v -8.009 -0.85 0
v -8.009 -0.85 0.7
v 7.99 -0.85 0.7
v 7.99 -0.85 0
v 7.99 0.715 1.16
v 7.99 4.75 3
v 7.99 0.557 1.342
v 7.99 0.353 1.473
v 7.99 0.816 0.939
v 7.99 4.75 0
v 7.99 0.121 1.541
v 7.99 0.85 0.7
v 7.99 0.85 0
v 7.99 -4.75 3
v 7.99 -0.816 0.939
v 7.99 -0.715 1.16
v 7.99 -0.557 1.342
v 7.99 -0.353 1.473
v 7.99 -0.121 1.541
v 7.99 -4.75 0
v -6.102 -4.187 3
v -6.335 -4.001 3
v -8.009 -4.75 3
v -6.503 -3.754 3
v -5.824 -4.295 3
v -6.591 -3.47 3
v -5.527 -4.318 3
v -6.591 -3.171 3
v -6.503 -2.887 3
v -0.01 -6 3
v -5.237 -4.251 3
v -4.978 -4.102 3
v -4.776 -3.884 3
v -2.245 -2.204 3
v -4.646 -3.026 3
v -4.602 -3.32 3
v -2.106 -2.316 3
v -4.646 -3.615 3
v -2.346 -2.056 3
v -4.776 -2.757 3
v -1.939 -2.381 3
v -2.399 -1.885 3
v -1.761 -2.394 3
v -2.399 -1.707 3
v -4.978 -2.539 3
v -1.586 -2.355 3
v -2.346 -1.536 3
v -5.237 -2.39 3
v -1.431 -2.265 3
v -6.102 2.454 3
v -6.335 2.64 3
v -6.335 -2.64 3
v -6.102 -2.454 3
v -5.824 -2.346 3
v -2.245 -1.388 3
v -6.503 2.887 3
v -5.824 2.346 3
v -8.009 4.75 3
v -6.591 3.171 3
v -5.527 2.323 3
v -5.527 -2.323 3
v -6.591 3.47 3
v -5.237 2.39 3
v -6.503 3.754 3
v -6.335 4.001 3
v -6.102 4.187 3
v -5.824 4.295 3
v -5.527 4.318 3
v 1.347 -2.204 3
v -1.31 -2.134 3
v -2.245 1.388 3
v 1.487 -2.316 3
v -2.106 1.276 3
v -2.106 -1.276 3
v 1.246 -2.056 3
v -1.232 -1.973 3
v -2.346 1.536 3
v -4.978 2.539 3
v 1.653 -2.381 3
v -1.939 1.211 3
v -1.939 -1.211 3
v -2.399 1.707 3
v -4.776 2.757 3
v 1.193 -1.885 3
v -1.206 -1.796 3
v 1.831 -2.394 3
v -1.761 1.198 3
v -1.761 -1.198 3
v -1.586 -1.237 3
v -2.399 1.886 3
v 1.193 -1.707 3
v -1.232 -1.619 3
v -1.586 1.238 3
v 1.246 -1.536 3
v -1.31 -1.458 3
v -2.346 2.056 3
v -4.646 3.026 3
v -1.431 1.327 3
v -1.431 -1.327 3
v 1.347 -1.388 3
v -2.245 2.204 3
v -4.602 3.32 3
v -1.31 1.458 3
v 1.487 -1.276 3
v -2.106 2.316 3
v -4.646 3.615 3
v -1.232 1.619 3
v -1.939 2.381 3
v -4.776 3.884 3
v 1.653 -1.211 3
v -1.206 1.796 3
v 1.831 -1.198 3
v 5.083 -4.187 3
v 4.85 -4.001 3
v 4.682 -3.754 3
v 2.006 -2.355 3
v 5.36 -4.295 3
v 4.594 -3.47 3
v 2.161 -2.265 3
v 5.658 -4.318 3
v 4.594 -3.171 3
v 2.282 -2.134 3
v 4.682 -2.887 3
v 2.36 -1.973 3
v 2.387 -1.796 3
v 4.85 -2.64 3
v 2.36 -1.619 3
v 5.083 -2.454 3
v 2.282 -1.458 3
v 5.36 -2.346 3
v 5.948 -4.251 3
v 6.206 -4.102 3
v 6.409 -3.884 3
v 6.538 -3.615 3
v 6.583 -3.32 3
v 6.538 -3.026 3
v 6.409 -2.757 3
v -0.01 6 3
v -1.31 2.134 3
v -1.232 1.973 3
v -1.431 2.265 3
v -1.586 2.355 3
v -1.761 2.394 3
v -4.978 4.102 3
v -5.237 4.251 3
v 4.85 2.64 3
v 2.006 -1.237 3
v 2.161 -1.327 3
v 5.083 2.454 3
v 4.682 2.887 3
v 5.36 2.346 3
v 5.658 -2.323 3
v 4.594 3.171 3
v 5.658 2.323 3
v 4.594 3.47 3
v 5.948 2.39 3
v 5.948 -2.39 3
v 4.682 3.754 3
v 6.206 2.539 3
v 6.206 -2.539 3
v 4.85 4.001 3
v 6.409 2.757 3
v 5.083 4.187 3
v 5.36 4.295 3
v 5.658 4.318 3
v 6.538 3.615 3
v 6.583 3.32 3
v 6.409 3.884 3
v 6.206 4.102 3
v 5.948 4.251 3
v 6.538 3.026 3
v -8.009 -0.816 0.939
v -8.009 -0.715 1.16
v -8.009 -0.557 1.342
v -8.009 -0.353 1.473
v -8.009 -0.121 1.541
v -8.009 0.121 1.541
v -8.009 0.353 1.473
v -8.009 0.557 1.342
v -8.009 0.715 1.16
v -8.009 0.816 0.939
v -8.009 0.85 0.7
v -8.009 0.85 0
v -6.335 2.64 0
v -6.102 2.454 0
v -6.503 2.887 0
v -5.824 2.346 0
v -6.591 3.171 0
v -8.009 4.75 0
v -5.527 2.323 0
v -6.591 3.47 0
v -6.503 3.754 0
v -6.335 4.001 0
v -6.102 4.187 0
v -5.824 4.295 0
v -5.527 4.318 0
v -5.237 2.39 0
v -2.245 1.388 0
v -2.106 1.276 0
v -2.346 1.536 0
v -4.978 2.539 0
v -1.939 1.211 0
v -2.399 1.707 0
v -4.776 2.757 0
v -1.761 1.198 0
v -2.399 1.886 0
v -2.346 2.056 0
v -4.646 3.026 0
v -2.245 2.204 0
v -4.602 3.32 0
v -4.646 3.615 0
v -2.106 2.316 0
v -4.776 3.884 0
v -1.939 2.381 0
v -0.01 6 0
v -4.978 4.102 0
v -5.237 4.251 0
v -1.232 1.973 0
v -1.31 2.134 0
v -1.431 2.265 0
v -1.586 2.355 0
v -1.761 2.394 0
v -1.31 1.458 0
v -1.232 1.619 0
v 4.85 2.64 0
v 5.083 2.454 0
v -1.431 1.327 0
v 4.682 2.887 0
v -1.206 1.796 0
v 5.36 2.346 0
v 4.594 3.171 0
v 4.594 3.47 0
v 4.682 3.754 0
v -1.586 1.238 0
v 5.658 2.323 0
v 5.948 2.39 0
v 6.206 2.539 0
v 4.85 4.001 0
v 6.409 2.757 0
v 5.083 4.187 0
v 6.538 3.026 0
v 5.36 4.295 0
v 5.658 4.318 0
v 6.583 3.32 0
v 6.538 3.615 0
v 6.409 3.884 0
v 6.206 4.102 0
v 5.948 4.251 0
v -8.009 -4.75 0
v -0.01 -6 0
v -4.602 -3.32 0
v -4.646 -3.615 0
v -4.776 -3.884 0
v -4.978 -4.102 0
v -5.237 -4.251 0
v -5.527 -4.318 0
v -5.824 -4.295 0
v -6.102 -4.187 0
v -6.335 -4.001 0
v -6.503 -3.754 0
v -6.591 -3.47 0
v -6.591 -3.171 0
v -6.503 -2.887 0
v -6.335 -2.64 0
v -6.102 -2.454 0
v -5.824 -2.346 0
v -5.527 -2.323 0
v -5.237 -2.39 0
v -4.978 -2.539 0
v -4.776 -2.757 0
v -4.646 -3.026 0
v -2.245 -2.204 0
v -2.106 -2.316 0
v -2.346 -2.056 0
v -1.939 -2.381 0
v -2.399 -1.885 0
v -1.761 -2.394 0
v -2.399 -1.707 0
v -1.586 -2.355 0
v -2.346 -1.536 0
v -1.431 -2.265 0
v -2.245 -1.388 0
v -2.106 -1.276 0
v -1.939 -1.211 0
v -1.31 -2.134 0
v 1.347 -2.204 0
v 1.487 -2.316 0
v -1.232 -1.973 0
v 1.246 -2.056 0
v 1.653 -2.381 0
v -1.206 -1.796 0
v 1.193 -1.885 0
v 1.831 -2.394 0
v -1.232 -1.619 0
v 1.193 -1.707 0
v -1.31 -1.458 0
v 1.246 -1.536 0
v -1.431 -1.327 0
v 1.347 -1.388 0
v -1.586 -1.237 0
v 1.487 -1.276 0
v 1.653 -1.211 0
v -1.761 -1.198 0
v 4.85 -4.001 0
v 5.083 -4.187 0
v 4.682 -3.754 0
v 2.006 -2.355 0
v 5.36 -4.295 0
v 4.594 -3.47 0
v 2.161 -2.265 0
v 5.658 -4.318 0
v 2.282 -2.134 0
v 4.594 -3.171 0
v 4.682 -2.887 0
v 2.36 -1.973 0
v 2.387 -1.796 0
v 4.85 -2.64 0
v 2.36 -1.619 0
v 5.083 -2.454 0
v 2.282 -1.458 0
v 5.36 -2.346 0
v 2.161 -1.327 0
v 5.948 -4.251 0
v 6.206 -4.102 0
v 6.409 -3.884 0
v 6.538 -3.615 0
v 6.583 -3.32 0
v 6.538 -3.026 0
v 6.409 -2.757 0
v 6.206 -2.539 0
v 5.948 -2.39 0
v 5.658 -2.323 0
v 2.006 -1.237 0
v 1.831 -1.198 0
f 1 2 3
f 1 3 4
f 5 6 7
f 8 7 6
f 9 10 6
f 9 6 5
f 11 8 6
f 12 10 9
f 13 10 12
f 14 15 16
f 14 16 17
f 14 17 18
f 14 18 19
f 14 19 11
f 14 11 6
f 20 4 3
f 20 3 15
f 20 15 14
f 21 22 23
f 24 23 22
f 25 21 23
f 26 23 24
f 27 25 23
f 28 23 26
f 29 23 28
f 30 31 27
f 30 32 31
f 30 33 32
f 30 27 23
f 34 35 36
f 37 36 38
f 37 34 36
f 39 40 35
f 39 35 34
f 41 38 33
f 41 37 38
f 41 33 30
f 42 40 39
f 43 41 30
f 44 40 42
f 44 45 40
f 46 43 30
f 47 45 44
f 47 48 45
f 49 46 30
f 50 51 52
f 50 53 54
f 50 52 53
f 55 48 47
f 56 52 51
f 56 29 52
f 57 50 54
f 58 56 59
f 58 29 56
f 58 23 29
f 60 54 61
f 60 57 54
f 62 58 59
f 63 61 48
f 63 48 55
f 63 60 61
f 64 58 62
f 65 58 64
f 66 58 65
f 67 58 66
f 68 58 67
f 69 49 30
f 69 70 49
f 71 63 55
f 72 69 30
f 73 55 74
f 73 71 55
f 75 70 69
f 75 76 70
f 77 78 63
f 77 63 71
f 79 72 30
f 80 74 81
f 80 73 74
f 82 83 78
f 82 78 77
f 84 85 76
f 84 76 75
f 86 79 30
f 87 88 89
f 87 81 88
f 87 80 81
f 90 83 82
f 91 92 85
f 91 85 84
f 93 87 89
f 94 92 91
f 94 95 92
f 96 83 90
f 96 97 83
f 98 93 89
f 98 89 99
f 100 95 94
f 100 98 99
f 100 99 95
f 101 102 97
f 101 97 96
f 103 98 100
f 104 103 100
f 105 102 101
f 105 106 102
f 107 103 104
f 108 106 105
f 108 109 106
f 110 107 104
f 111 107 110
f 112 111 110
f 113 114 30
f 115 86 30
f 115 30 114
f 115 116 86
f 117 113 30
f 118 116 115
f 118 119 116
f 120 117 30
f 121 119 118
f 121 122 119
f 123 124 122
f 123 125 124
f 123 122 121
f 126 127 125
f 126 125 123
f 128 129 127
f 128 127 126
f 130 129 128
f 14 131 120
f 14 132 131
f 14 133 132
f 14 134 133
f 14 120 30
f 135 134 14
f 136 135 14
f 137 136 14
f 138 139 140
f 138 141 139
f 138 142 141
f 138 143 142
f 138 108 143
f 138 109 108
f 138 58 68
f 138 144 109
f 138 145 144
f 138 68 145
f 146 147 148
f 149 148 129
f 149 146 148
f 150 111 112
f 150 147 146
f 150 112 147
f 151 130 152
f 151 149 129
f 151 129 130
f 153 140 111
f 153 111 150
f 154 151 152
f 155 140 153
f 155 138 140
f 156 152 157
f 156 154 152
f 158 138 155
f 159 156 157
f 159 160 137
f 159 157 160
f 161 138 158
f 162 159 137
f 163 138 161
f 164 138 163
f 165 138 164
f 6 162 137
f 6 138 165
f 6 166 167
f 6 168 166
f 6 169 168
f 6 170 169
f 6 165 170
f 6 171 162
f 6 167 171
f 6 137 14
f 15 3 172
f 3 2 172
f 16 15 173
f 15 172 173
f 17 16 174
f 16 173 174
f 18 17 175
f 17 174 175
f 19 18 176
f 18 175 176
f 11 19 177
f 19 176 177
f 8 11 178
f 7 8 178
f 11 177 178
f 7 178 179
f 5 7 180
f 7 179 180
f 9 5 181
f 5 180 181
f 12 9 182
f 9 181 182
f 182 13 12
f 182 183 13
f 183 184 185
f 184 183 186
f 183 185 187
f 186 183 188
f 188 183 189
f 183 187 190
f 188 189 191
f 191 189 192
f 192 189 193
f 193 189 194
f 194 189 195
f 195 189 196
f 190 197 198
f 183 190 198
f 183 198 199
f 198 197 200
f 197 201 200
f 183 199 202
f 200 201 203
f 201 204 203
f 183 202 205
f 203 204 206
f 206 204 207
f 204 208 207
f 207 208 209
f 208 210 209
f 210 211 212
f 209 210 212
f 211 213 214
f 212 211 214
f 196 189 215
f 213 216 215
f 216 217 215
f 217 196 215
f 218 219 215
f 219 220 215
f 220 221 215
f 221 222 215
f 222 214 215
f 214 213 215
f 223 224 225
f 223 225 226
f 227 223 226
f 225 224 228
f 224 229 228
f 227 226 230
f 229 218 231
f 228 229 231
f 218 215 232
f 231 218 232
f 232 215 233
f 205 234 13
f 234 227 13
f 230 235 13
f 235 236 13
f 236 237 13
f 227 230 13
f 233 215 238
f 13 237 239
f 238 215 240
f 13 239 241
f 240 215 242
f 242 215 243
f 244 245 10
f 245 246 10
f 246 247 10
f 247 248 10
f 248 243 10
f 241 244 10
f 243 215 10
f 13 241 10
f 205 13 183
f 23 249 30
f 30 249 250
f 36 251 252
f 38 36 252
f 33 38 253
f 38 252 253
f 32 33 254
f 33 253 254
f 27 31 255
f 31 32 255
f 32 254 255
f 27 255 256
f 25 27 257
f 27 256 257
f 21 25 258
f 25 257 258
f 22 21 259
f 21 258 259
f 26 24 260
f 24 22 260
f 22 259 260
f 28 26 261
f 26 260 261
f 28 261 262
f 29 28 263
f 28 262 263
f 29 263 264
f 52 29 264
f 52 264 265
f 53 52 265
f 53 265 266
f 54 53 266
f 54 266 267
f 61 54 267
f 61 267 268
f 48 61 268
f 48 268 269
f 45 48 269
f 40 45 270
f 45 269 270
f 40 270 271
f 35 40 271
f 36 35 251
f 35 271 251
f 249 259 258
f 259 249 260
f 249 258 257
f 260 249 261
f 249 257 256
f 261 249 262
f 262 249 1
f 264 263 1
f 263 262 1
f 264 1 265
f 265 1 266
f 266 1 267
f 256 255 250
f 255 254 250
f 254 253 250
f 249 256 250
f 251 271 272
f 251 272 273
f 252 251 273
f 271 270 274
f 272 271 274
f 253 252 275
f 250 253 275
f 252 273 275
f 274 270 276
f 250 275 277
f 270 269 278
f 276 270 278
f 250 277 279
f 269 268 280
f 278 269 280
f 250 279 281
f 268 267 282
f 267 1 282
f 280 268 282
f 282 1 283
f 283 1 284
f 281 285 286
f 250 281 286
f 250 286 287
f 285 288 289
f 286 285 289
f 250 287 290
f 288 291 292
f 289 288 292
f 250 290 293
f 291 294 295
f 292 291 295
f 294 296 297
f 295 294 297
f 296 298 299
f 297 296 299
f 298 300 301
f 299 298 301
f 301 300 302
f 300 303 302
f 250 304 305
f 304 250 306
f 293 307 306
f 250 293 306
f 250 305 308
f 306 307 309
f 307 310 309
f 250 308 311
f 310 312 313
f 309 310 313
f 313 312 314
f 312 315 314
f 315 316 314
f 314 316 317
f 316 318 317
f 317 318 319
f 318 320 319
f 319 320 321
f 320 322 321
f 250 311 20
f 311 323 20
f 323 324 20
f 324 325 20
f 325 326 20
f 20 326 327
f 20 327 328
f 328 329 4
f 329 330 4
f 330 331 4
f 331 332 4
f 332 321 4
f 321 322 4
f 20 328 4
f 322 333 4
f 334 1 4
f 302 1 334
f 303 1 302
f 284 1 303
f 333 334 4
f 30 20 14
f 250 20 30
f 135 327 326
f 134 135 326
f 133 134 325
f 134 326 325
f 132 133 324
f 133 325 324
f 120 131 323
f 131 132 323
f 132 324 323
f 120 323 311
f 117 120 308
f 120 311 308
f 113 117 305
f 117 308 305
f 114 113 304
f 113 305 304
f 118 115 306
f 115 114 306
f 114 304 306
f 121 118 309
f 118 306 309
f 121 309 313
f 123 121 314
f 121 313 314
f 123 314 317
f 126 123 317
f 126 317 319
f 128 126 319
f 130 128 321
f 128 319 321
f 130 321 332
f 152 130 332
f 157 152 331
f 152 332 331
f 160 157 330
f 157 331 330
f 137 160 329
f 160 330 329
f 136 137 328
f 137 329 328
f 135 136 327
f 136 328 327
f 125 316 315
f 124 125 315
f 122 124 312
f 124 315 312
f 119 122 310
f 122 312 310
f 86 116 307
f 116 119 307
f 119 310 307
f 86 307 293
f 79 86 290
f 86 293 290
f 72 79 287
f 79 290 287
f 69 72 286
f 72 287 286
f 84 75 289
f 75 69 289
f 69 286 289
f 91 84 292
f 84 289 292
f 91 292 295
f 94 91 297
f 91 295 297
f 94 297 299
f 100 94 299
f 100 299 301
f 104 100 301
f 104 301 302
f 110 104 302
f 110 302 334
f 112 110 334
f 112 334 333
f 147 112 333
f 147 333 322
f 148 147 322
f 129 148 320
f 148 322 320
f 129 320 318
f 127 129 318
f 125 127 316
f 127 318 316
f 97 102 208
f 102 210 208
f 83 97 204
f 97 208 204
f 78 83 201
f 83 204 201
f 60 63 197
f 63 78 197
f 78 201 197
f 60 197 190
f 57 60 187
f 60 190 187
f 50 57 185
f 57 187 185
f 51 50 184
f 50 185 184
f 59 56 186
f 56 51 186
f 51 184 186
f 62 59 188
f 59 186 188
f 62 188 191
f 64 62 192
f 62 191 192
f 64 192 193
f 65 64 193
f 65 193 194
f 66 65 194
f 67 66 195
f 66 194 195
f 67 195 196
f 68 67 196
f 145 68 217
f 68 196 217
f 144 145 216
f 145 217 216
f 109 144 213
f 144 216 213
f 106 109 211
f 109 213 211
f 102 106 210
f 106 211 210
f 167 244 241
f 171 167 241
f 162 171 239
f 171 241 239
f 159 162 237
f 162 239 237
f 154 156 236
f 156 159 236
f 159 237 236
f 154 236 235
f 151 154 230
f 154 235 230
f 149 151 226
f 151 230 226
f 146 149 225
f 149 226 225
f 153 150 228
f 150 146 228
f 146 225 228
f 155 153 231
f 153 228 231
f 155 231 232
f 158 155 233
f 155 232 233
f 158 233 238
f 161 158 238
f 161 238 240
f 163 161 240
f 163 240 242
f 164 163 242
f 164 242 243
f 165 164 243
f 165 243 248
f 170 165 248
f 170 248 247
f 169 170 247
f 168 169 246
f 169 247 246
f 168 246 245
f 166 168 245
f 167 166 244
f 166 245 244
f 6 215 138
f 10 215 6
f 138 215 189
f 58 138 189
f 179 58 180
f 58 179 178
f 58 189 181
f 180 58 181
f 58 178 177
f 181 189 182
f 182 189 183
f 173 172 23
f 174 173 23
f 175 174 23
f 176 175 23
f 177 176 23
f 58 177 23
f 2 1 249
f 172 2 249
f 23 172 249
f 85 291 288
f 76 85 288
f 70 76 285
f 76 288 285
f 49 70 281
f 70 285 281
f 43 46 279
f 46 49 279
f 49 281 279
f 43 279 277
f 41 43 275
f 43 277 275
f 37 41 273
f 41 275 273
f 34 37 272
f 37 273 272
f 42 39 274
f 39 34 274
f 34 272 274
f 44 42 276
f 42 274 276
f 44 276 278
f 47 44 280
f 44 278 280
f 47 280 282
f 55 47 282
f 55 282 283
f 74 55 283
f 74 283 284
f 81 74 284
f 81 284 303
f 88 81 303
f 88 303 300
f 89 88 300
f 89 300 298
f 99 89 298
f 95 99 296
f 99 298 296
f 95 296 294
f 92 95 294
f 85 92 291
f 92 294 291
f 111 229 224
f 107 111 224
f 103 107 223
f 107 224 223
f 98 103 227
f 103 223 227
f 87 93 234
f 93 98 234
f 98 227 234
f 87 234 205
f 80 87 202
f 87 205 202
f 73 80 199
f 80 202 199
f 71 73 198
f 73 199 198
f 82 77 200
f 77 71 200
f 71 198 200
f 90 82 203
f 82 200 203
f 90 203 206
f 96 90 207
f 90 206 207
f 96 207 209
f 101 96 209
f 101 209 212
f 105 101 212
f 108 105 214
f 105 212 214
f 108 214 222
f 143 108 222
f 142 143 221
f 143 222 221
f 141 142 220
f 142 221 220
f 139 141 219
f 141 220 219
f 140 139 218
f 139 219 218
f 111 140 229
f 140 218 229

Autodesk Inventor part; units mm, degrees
ref_plane "YZ Plane" through (0, 0, 0) normal (1, 0, 0) x (0, 1, 0)
ref_plane "XZ Plane" through (0, 0, 0) normal (0, 1, 0) x (-1, 0, 0)
ref_plane "XY Plane" through (0, 0, 0) normal (0, 0, 1) x (1, 0, 0)
sketch "Sketch1" plane through (0, 0, 0) normal (0, 0, 1) x (1, 0, 0)
  line L0 (-8.0095, -1.25) -> (7.9905, -1.25) construction
  line L1 (7.9905, -1.25) -> (7.9905, 1.25) construction
  line L2 (7.9905, 1.25) -> (-8.0095, 1.25) construction
  line L3 (-8.0095, 1.25) -> (-8.0095, -1.25) construction
  line L4 (-8.0095, -1.25) -> (7.9905, 1.25) construction
  line L5 (7.9905, -1.25) -> (-8.0095, 1.25) construction
  circle A0 centre (5.5829, 3.3205) radius 1
  line L6 (-0.0095, 0) -> (-0.0095, 6) construction
  line L7 (-0.0095, 0) -> (-0.0095, -6) construction
  line L8 (-0.0095, 6) -> (-8.0095, 4.75)
  line L9 (-8.0095, 4.75) -> (-8.0095, -4.75)
  line L10 (-8.0095, -4.75) -> (-0.0095, -6)
  line L11 (-0.0095, 6) -> (7.9905, 4.75)
  line L12 (7.9905, 4.75) -> (7.9905, -4.75)
  line L13 (7.9905, -4.75) -> (-0.0095, -6)
  line L14 (7.9905, 4.75) -> (-8.0095, -4.75) construction
  line L15 (-8.0095, 4.75) -> (7.9905, -4.75) construction
  circle A1 centre (-5.6019, 3.3205) radius 1
  line L16 (-8.0095, 0) -> (7.9905, 0) construction
  circle A2 centre (5.5829, -3.3205) radius 1
  circle A3 centre (-5.6019, -3.3205) radius 1
  circle A4 centre (-0.0095, 0) radius 2.54 construction
  line L17 (-0.0095, 0) -> (1.7866, -1.796) construction
  line L18 (-0.0095, 0) -> (-1.8055, -1.796) construction
  line L19 (-0.0095, 0) -> (-1.8055, 1.7961) construction
  circle A5 centre (1.7866, -1.796) radius 0.6
  circle A6 centre (-1.8055, -1.796) radius 0.6
  circle A7 centre (-1.8055, 1.7961) radius 0.6
  point P0 (0, 0)
  point P1 (-0.0095, 0)
  point P2 (-0.0095, 0)
  dimension "d1" = 2.5
  dimension "d2" = 2
  dimension "d3" = 6
  dimension "d4" = 16
  dimension "d5" = 2.8
  dimension "d13" = 5.08
  dimension "d14" = 1.2
extrude "Extrusion2" add sketch "Sketch1" along normal blind 3
sketch "Sketch2" plane through (7.9905, -4.75, 0) normal (1, 0, 0) x (0, 0, -1)
  line L0 (0, 9.5) -> (0, 0) projected
  arc A0 (-0.7, 5.6) -> (-0.7, 3.9) centre (-0.7, 4.75) ccw
  line L1 (-0.7, 5.6) -> (0, 5.6)
  line L2 (-0.7, 3.9) -> (0, 3.9)
  line L3 (0, 5.6) -> (0, 3.9)
  line L4 (-3, 0) -> (-3, 9.5) projected
  line L5 (-3, 4.75) -> (-0.7, 4.75) construction
  point P0 (0, 4.75)
  dimension "d11" = 1.7
  dimension "d19" = 0.7
sketch "Sketch3" plane through (0, 0, 0) normal (0, 0, -1) x (-1, 0, 0)
  line L0 (-7.9905, 4.75) -> (-7.9905, -4.75) projected
  line L1 (8.0095, -4.75) -> (8.0095, 4.75) projected
  line L2 (-7.9905, 0) -> (8.0095, 0)
  point P0 (0, 0)
sweep "Sweep1" cut profiles "Sketch2" path "Sketch3" path curves L2
properties part number "LED cooling tubing cap 2"
